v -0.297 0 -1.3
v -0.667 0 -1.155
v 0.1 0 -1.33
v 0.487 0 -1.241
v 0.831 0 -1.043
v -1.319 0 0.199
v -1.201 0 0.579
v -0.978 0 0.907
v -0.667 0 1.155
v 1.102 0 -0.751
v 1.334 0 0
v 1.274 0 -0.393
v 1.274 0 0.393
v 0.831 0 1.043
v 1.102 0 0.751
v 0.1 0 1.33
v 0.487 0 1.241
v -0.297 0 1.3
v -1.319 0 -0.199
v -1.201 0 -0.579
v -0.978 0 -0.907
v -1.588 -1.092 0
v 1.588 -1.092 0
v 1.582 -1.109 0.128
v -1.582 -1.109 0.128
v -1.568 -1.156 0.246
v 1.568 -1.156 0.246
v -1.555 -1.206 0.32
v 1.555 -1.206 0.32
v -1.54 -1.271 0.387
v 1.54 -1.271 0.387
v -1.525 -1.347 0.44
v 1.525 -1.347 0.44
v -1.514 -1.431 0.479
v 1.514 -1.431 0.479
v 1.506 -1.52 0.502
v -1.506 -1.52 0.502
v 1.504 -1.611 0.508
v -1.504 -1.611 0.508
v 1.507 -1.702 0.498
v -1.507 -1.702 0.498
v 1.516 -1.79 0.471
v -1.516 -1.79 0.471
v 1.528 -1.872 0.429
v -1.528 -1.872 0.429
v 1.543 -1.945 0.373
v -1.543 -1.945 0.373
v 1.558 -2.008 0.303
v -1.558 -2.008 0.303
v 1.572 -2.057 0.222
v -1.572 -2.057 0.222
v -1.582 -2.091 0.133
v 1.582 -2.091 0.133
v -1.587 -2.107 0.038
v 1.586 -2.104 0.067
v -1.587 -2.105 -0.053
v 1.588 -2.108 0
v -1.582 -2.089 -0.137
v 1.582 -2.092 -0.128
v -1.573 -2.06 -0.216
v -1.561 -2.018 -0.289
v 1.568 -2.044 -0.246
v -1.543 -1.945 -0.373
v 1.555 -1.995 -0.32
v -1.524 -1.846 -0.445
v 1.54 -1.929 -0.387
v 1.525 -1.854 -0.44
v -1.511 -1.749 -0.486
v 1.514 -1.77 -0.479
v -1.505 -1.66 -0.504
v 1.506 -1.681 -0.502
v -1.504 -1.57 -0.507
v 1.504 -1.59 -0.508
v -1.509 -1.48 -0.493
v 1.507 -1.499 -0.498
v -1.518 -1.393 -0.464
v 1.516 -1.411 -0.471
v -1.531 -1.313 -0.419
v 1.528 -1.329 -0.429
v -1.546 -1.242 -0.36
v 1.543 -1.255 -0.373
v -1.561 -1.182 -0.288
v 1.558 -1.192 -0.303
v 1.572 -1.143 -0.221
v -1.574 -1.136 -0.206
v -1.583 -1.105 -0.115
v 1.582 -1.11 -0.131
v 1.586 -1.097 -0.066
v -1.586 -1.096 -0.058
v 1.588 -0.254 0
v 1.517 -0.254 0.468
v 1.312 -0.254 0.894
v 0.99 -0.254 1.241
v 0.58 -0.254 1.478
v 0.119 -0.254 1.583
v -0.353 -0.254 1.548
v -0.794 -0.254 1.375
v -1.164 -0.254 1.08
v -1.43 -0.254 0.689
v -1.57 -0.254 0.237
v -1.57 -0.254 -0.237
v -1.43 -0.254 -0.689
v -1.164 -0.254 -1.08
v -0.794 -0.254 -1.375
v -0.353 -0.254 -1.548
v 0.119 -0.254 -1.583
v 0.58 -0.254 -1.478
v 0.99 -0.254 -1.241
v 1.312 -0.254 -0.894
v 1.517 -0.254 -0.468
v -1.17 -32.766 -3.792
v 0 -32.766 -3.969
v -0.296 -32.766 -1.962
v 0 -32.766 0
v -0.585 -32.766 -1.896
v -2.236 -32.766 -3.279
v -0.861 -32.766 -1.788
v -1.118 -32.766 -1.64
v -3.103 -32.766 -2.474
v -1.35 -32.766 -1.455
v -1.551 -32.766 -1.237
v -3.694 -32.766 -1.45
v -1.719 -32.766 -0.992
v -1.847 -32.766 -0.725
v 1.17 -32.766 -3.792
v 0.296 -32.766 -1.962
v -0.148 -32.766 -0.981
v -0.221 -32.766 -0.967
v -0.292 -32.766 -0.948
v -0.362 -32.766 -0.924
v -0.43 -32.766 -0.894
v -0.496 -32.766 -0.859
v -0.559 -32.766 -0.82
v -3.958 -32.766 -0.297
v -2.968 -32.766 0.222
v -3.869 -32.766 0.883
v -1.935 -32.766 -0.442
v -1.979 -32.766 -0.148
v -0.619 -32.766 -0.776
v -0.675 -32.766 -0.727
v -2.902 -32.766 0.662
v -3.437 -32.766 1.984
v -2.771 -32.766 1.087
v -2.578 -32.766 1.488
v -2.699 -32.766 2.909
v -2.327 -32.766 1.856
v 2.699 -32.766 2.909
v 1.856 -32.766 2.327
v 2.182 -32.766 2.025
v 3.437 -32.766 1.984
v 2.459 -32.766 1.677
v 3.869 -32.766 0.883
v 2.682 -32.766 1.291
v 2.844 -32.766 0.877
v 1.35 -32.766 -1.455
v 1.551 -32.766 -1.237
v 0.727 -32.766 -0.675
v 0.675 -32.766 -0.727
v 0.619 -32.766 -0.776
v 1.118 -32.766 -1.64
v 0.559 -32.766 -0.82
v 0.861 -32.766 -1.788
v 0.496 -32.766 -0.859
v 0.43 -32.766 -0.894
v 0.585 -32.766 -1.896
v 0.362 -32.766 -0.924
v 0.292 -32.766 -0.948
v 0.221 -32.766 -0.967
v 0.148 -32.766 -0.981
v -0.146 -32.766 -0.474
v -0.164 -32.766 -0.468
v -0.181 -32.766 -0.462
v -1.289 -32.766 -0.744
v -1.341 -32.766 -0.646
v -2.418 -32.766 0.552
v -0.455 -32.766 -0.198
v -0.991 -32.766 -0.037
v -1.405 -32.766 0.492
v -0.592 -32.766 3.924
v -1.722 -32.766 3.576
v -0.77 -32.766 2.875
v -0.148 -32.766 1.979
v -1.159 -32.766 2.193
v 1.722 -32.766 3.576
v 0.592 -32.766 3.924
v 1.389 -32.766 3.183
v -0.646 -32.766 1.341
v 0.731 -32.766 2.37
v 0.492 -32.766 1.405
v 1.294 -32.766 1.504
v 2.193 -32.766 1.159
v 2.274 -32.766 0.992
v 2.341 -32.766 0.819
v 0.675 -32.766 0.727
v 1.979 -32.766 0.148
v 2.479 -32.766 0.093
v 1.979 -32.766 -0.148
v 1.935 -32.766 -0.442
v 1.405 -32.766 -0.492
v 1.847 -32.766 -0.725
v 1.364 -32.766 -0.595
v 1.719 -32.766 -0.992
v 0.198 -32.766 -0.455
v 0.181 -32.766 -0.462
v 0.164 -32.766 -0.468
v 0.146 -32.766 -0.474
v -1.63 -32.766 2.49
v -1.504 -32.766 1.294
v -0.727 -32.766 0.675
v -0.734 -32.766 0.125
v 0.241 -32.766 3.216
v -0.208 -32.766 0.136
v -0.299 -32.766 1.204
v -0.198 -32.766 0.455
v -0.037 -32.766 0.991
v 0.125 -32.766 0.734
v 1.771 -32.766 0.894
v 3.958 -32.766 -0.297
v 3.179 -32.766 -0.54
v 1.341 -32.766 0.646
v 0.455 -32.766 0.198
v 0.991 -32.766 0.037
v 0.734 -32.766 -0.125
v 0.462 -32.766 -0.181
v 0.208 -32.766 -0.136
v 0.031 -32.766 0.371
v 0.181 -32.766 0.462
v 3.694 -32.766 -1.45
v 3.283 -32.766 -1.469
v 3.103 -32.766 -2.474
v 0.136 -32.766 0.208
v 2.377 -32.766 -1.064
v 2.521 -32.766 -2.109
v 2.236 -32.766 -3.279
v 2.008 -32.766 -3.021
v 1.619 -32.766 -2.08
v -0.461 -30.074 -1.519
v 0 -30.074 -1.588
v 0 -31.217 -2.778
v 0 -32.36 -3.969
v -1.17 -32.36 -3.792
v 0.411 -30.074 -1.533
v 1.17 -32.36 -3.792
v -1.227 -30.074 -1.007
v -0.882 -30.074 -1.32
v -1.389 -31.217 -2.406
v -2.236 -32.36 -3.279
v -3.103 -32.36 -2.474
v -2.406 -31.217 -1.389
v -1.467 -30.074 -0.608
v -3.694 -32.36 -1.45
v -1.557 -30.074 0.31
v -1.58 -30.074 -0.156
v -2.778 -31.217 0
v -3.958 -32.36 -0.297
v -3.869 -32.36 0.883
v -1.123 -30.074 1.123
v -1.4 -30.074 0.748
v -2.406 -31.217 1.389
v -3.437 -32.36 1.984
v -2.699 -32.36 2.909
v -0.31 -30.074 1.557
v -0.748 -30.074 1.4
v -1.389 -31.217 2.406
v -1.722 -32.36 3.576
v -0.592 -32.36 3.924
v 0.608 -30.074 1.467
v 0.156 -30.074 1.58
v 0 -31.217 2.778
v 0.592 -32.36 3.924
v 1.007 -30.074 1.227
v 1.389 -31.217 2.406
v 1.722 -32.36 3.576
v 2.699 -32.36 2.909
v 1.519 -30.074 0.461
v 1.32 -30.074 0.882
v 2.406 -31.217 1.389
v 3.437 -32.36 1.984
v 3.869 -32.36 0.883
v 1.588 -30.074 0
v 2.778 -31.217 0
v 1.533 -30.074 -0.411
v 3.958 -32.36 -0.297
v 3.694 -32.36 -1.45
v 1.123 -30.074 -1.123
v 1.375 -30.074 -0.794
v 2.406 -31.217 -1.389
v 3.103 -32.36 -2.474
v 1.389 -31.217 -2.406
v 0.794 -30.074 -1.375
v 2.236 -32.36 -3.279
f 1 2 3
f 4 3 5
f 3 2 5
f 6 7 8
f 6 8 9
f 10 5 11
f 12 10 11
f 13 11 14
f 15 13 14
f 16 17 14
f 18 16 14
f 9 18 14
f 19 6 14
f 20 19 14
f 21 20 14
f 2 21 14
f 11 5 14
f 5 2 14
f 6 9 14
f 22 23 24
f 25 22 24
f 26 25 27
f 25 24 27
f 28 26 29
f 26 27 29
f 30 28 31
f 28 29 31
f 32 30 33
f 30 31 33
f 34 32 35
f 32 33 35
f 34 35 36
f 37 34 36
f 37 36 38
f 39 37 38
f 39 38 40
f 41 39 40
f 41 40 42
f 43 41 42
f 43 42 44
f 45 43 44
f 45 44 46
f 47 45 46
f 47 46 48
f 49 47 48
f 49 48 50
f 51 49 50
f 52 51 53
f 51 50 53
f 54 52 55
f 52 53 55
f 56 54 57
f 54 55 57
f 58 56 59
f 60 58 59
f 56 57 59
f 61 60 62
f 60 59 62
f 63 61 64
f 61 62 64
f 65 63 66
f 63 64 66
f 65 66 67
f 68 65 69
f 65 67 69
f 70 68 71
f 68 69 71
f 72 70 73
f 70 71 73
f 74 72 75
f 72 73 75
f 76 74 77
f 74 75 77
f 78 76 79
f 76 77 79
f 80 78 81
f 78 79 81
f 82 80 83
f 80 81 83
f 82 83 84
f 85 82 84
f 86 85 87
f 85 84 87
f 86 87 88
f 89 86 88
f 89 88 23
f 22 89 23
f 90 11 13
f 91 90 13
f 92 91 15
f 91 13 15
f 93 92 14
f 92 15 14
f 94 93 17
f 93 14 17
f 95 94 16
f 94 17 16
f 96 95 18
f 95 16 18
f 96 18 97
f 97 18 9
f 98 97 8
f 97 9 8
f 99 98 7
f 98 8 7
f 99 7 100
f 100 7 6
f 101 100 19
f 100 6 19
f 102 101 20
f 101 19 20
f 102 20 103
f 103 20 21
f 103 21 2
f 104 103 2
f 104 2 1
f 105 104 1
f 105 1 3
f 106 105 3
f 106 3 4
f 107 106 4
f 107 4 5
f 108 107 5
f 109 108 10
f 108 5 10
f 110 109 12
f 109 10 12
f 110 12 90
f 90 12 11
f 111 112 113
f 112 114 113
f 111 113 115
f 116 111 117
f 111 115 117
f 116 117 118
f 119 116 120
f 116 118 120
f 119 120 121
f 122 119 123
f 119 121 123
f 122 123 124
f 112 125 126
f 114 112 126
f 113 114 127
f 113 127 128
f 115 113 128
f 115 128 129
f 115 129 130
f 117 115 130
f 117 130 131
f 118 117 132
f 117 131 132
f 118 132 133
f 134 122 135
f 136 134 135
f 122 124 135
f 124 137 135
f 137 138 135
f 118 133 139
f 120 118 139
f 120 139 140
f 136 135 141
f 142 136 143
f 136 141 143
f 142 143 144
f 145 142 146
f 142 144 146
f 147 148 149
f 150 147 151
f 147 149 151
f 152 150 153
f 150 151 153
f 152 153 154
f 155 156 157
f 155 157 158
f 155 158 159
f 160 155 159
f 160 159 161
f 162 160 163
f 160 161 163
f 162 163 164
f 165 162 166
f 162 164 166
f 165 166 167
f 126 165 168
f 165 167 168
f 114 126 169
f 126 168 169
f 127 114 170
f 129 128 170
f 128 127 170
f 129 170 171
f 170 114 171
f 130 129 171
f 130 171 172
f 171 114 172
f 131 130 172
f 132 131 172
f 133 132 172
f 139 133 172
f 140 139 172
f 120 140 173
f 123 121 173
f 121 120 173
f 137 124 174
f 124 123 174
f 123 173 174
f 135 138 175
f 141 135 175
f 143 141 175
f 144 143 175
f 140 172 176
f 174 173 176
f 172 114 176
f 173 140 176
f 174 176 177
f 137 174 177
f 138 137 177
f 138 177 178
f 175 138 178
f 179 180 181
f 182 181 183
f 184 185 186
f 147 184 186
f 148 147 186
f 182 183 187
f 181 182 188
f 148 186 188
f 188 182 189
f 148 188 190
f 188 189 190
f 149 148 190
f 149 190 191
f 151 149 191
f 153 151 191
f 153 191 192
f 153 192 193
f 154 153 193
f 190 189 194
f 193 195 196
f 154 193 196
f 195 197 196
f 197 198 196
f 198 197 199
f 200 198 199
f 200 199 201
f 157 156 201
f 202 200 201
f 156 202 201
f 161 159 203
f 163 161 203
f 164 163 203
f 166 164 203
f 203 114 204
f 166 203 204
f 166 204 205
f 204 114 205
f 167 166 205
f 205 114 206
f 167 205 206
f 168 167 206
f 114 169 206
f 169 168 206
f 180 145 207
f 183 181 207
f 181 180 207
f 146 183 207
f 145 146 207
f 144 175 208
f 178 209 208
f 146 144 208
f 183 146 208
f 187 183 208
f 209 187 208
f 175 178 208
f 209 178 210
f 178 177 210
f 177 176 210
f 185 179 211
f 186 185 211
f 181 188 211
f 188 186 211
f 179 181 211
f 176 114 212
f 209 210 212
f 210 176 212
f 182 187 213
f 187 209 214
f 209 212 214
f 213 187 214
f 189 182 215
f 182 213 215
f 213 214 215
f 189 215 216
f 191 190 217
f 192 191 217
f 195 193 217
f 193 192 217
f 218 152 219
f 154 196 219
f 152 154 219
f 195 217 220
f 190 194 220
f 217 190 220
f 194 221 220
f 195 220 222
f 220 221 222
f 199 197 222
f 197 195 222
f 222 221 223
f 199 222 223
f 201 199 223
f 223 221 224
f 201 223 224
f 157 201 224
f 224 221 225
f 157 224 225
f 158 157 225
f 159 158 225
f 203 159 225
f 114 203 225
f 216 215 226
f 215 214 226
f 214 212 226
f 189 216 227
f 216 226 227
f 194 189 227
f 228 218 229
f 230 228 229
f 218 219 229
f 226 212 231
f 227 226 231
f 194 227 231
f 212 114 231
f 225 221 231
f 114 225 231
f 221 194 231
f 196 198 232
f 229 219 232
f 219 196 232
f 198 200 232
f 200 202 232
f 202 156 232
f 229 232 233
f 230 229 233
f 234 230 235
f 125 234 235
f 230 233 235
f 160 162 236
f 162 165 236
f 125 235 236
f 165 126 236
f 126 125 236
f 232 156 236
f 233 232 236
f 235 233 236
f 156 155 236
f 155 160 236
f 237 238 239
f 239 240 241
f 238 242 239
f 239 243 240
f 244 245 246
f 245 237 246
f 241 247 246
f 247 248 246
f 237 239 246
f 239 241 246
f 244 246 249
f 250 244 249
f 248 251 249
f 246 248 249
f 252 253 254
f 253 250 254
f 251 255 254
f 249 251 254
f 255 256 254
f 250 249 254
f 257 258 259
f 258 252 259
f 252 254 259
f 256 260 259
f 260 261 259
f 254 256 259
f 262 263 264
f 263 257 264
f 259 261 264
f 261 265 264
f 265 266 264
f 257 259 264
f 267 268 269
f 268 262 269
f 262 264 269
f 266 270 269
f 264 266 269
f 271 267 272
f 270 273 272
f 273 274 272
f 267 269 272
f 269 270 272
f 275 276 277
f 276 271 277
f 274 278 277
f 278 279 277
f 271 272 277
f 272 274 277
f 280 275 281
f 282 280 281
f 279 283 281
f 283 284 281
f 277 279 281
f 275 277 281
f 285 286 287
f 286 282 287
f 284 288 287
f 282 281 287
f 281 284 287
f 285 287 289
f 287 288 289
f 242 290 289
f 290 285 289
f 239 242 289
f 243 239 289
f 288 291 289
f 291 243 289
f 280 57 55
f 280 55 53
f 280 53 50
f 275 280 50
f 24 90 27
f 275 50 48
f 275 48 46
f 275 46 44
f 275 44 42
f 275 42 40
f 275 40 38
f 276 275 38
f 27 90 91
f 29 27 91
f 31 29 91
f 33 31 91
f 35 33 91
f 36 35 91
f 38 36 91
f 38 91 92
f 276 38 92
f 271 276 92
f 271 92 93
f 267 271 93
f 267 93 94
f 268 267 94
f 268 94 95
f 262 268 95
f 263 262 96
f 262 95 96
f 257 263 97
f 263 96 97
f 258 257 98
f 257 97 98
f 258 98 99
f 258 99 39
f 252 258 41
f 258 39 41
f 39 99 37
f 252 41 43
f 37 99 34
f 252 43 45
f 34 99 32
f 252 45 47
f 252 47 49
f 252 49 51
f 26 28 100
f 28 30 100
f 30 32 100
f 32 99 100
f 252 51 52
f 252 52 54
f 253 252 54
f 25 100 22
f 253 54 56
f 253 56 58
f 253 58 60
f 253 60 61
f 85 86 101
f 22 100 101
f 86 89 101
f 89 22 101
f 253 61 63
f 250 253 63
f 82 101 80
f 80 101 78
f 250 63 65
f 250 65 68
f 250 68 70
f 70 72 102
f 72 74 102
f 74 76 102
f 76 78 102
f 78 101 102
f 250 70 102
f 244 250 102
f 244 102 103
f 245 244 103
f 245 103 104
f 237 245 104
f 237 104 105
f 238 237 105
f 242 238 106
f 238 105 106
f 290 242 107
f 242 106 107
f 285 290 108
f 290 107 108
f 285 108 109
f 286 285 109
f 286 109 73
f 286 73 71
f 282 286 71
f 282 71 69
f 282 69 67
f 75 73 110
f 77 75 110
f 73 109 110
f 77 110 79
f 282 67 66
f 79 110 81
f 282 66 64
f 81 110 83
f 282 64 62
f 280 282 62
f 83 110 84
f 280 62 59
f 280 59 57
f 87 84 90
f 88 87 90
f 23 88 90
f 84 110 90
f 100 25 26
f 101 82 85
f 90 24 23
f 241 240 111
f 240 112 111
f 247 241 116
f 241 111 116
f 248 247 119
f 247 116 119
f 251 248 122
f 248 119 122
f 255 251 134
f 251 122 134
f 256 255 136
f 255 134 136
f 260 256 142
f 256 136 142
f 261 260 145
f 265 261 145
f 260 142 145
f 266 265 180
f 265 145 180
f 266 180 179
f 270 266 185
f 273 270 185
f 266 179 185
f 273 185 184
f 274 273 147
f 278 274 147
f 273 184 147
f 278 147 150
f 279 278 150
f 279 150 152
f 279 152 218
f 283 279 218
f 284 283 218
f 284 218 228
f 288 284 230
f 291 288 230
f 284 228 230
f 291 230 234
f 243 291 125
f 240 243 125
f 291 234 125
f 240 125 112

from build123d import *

# Parameters (mm, degrees)
F0_R     = 1.5875
F1_DEPTH = 30.0736
F2_SIZE  = 0.254
F6_R     = 0.508
F7_DEPTH = 5.59535


with BuildPart() as f1:
    # F0 (on Front) → F1 (new body)
    with BuildSketch(Plane.XZ):
        Circle(F0_R)
    extrude(amount=F1_DEPTH)

    # F2
    f2_edges = [f1.edges().sort_by_distance(p)[0] for p in [
        (-1.5875, 0, 0),
    ]]
    chamfer(f2_edges, length=F2_SIZE)

    # F4: sweep along a path in F4_path
    with BuildLine(Plane(origin=(1.5875, -30.0736, 0), x_dir=(0, 0, -1), z_dir=(0, 1, 0))) as f4_path:
        CenterArc((0, 1.5875), 1.5875, 0, 360)
    # F3 (on Right) → F4 (sweep)
    with BuildSketch(Plane.YZ):
        Polygon((-30.0736, 0), (-30.0736, 1.5875), (-32.3596, 3.96875), (-32.766, 3.96875), (-32.766, 0), align=None)
    sweep(path=f4_path.line)

    # F6 (on offset) → F7 (cut, through all)
    with BuildSketch(Plane.YZ.offset(1.6256)):
        with Locations((-1.6002, 0)):
            Circle(F6_R)
    extrude(amount=-F7_DEPTH, mode=Mode.SUBTRACT)


solid = f1.part
